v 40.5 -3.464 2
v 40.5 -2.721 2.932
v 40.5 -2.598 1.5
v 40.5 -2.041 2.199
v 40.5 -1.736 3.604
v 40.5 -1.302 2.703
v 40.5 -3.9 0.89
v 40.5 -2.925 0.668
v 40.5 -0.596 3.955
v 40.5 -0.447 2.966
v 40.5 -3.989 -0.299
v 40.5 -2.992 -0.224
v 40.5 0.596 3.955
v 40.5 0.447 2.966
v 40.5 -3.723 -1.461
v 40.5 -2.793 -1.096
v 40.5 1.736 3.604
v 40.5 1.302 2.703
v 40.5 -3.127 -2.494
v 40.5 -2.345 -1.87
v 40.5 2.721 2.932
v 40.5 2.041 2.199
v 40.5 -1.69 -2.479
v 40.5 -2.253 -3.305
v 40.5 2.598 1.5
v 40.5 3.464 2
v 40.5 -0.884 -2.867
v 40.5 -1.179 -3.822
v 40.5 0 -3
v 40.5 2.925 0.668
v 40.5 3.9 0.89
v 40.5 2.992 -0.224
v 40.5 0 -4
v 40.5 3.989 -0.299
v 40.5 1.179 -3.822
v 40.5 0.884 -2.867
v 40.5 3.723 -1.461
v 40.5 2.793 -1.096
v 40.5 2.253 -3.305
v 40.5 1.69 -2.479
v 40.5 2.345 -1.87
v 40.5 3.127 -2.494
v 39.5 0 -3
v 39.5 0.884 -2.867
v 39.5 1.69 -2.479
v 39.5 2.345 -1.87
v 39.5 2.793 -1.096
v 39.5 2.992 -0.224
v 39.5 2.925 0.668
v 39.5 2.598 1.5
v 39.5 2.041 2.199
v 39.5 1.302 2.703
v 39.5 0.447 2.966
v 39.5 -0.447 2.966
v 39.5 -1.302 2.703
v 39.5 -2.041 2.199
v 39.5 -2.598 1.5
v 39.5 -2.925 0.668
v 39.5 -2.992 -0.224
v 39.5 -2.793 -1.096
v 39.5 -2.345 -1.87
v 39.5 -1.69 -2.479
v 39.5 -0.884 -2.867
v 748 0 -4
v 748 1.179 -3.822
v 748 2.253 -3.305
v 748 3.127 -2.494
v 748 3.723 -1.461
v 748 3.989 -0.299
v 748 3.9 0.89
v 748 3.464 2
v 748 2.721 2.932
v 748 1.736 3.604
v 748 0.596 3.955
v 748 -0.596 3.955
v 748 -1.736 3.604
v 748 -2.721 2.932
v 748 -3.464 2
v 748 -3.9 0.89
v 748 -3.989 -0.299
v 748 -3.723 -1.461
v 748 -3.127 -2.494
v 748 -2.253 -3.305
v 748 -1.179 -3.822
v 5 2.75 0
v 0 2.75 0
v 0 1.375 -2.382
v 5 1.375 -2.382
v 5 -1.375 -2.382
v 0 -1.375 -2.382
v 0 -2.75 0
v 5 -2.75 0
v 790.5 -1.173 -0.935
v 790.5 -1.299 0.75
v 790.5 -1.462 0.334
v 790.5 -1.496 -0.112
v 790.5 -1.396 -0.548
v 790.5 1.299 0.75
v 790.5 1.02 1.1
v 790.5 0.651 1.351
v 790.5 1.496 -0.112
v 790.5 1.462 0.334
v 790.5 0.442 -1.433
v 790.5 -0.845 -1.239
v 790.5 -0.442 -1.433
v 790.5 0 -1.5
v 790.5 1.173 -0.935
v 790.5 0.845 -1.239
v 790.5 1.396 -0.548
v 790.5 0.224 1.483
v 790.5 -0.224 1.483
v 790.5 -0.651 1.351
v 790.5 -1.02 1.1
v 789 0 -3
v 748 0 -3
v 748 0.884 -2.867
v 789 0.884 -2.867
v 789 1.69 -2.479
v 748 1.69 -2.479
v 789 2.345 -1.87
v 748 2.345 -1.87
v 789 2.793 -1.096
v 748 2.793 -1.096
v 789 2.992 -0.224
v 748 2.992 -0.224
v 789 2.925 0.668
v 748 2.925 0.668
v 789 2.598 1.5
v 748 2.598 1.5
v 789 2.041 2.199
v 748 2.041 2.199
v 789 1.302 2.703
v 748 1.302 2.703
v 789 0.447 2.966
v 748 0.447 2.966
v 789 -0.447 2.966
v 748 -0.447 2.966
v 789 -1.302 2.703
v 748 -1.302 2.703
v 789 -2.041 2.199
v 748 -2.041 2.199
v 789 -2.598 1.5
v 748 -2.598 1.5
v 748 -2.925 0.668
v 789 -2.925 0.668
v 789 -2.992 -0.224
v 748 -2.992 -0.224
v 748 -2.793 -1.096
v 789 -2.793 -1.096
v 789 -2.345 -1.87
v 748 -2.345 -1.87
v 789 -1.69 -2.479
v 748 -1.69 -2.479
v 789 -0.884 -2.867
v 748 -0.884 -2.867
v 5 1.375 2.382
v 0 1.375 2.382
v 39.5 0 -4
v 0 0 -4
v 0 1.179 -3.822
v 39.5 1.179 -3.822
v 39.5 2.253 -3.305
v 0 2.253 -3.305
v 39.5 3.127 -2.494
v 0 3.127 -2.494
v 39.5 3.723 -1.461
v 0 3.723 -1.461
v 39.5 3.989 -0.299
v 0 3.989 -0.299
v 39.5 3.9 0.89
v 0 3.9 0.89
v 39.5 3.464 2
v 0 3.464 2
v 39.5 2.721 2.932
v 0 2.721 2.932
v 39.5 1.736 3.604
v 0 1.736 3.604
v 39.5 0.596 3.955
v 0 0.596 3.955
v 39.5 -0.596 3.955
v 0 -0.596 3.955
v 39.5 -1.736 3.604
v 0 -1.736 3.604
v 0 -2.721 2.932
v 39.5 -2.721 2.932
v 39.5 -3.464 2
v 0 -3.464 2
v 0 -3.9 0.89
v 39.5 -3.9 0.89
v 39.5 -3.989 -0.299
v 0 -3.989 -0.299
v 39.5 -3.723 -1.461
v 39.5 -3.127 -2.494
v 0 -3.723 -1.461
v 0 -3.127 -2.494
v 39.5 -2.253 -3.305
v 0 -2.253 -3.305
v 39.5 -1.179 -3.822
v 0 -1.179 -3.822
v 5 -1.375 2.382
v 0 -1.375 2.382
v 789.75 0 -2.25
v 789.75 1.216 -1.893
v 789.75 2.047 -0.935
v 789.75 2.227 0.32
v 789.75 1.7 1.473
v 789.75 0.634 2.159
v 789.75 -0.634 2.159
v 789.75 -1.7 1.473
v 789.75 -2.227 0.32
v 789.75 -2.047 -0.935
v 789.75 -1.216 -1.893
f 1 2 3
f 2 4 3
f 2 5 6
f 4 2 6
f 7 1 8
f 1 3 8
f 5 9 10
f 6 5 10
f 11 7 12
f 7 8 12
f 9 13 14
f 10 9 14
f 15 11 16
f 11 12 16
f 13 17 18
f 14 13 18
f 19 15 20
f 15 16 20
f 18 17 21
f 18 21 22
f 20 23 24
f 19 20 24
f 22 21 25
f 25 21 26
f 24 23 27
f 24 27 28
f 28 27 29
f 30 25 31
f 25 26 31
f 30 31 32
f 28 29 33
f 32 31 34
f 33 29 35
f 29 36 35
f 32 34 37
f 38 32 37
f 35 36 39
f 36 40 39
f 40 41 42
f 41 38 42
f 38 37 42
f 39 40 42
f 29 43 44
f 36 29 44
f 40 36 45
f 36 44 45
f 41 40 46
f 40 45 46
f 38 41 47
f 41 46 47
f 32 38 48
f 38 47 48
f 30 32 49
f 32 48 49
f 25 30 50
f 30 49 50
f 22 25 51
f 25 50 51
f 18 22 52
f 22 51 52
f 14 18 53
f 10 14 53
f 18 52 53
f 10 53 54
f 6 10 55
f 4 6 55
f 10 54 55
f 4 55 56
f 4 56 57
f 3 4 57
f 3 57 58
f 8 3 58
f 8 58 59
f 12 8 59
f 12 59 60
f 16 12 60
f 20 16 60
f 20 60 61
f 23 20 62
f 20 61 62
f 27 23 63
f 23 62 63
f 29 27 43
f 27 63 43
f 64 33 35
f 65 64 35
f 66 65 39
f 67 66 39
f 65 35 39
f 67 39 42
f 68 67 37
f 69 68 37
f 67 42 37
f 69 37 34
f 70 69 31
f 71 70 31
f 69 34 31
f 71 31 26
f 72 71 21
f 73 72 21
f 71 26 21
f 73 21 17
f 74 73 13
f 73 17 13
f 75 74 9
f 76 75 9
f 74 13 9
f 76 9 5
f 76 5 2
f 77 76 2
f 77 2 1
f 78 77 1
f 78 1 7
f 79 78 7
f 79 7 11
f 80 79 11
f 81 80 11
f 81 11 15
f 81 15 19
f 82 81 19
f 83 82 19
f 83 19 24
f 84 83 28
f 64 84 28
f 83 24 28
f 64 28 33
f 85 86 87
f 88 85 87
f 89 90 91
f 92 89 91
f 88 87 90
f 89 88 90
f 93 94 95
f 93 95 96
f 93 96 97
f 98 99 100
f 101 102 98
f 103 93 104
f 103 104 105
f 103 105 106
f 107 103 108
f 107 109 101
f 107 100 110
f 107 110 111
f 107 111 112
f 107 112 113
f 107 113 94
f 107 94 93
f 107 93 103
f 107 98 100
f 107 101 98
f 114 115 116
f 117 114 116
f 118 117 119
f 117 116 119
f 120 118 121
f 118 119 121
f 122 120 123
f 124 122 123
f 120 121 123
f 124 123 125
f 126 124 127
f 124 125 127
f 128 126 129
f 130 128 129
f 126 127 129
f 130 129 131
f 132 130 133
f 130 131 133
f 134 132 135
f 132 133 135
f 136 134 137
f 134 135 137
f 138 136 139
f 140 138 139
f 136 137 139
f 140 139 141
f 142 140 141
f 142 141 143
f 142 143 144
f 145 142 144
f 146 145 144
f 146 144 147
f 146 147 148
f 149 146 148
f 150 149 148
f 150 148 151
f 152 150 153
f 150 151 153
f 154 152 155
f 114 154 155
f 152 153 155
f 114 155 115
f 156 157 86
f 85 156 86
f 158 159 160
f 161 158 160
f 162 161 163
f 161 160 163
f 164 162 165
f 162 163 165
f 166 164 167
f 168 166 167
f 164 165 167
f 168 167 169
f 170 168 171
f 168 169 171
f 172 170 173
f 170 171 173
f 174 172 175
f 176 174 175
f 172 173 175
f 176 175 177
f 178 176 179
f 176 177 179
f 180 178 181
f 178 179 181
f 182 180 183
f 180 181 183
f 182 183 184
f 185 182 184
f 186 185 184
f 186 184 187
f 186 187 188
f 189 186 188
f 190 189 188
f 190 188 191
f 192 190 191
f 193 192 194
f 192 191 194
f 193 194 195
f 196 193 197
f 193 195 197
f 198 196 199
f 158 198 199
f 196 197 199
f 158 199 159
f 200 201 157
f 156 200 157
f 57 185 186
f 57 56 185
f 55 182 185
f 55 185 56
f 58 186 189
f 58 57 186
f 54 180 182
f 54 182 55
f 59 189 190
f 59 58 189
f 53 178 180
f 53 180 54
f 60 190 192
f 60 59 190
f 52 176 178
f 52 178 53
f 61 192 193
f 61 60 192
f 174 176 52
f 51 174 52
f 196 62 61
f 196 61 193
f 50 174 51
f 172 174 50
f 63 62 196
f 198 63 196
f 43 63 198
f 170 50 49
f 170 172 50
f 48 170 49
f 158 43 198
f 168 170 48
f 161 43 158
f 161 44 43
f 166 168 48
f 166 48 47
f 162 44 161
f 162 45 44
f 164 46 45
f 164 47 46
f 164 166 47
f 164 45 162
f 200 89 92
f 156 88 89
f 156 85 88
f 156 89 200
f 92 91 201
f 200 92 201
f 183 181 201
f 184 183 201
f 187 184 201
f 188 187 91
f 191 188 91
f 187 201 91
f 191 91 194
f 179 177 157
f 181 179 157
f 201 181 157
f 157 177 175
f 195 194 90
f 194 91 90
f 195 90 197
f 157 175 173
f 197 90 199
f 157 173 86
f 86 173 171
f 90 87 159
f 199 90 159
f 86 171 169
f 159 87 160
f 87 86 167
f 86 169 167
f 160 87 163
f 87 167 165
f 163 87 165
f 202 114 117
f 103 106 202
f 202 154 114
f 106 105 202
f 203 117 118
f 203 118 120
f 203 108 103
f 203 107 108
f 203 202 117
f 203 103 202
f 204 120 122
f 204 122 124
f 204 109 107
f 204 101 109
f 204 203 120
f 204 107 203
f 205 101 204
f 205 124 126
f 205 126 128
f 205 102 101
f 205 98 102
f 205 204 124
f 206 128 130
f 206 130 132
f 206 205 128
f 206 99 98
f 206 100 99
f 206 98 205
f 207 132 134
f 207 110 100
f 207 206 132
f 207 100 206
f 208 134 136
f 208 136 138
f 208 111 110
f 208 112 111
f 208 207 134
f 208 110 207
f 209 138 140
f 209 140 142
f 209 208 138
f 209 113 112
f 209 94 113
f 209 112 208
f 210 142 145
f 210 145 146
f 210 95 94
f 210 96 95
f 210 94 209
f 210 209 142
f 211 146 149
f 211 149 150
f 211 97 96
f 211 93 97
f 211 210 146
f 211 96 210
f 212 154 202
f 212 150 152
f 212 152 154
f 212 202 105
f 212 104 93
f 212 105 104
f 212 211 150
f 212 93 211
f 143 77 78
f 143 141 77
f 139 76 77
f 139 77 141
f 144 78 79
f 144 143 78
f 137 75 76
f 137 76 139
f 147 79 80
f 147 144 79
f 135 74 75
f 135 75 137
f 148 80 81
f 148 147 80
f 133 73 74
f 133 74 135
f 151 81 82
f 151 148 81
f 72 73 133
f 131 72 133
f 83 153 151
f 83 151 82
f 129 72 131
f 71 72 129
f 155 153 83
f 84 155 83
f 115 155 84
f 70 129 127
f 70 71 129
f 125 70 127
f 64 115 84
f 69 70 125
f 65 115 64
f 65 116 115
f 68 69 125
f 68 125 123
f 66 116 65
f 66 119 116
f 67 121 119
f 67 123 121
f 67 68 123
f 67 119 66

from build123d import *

# Parameters (mm, degrees)
SKETCH_1_R          = 4
EXTRUDE_1_DEPTH     = 39.5
SKETCH_2_R          = 3
EXTRUDE_2_DEPTH     = 1
SKETCH_3_R          = 4
EXTRUDE_3_DEPTH     = 707.5
SKETCH_4_R          = 3
EXTRUDE_4_DEPTH     = 42.5
CHAMFER_1_SIZE      = 1.5
CUT_EXTRUDE_1_DEPTH = 5


with BuildPart() as part:
    # 草图1 → 凸台-拉伸1 (new body)
    with BuildSketch(Plane(origin=(0, 0, 0), x_dir=(0, 0, -1), z_dir=(1, 0, 0))):
        Circle(SKETCH_1_R)
    extrude(amount=EXTRUDE_1_DEPTH)

    # 草图2 → 凸台-拉伸2 (add)
    with BuildSketch(Plane(origin=(39.5, 0, 0), x_dir=(0, 0, -1), z_dir=(1, 0, 0))):
        Circle(SKETCH_2_R)
    extrude(amount=EXTRUDE_2_DEPTH)

    # 草图3 → 凸台-拉伸3 (add)
    with BuildSketch(Plane(origin=(40.5, 0, 0), x_dir=(0, 0, -1), z_dir=(1, 0, 0))):
        Circle(SKETCH_3_R)
    extrude(amount=EXTRUDE_3_DEPTH)

    # 草图4 → 凸台-拉伸4 (add)
    with BuildSketch(Plane(origin=(748, 0, 0), x_dir=(0, 0, -1), z_dir=(1, 0, 0))):
        Circle(SKETCH_4_R)
    extrude(amount=EXTRUDE_4_DEPTH)

    # 倒角1
    chamfer_1_edges = [part.edges().sort_by_distance(p)[0] for p in [
        (790.5, 0, 3),
    ]]
    chamfer(chamfer_1_edges, length=CHAMFER_1_SIZE)

    # 草图7 → 切除-拉伸1 (cut)
    with BuildSketch(Plane.ZY):
        Polygon((-2.38156986, 1.375), (-2.38156986, -1.375), (0, -2.75), (2.38156986, -1.375), (2.38156986, 1.375), (0, 2.75), align=None)
    extrude(amount=-CUT_EXTRUDE_1_DEPTH, mode=Mode.SUBTRACT)


solid = part.part
